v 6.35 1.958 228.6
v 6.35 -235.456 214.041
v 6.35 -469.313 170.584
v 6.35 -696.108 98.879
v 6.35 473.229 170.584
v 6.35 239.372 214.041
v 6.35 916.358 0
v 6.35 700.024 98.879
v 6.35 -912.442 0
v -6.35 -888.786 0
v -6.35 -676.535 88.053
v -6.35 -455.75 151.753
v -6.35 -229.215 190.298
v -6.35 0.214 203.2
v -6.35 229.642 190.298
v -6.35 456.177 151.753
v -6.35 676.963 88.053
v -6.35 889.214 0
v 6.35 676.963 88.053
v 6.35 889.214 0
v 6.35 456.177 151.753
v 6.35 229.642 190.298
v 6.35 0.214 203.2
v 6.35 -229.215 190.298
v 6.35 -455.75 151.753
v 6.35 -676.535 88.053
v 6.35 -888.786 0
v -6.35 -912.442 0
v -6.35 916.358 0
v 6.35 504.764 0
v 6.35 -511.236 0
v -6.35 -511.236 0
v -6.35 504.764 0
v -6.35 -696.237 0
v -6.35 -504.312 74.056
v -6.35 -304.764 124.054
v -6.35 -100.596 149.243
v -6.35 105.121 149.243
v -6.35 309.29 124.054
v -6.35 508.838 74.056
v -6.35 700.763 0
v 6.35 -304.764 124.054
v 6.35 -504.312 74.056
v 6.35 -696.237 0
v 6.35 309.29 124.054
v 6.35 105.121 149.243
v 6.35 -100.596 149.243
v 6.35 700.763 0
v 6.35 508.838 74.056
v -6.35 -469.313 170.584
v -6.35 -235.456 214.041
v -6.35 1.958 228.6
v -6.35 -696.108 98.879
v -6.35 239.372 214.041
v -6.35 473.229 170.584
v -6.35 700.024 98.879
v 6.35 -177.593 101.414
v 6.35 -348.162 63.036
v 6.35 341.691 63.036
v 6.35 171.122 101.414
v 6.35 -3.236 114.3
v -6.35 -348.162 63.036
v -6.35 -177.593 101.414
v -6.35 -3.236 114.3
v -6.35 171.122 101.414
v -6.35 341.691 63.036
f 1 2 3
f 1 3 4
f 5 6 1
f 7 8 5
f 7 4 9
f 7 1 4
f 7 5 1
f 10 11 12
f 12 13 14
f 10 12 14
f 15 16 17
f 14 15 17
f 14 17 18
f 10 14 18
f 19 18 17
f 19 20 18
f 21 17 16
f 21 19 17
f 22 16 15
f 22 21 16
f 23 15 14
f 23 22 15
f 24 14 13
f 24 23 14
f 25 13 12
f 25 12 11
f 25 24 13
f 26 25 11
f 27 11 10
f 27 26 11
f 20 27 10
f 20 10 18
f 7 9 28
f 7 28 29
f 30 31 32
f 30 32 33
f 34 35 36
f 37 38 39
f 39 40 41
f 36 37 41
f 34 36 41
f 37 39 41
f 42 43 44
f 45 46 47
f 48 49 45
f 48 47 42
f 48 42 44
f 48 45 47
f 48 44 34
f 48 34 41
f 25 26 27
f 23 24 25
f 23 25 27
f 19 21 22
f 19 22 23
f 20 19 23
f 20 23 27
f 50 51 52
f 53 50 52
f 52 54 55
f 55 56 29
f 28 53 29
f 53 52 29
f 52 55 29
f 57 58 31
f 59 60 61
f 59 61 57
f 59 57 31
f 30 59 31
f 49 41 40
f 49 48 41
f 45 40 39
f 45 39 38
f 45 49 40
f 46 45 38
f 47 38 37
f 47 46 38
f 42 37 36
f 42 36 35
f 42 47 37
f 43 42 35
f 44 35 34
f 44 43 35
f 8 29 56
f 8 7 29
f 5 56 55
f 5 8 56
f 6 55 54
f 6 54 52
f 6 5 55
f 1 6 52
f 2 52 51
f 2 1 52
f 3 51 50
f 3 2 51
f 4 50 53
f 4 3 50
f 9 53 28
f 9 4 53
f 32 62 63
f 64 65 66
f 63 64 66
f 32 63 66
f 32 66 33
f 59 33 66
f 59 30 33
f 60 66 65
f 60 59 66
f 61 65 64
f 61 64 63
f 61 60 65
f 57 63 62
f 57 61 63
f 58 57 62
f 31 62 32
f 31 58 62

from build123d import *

# Parameters (mm, degrees)
F1_DEPTH = 6.35
F3_DEPTH = 6.35
F5_DEPTH = 6.35
F7_DEPTH = 6.35


with BuildPart() as f1:
    # F0 (on Right) → F1 (new body, symmetric)
    with BuildSketch(Plane.YZ):
        with BuildLine():
            ThreePointArc((916.3579663121, 0), (1.9579663121, 228.6), (-912.4420336879, 0))
            Line((-912.4420336879, 0), (916.3579663121, 0))
        make_face()
    extrude(amount=F1_DEPTH, both=True)


with BuildPart() as f3:
    # F2 (on Right) → F3 (new body, symmetric)
    with BuildSketch(Plane.YZ):
        with BuildLine():
            ThreePointArc((889.2136817136, 0), (0.2136817136, 203.2), (-888.7863182864, 0))
            Line((-888.7863182864, 0), (889.2136817136, 0))
        make_face()
    extrude(amount=F3_DEPTH, both=True)


with BuildPart() as f5:
    # F4 (on Right) → F5 (new body, symmetric)
    with BuildSketch(Plane.YZ):
        with BuildLine():
            ThreePointArc((700.7628045471, 0), (2.2628045471, 152.4), (-696.2371954529, 0))
            Line((-696.2371954529, 0), (700.7628045471, 0))
        make_face()
    extrude(amount=F5_DEPTH, both=True)


with BuildPart() as f7:
    # F6 (on Right) → F7 (new body, symmetric)
    with BuildSketch(Plane.YZ):
        with BuildLine():
            ThreePointArc((504.7643018254, 0), (-3.2356981746, 114.3), (-511.2356981746, 0))
            Line((-511.2356981746, 0), (504.7643018254, 0))
        make_face()
    extrude(amount=F7_DEPTH, both=True)


solid = Compound([f1.part, f3.part, f5.part, f7.part])
